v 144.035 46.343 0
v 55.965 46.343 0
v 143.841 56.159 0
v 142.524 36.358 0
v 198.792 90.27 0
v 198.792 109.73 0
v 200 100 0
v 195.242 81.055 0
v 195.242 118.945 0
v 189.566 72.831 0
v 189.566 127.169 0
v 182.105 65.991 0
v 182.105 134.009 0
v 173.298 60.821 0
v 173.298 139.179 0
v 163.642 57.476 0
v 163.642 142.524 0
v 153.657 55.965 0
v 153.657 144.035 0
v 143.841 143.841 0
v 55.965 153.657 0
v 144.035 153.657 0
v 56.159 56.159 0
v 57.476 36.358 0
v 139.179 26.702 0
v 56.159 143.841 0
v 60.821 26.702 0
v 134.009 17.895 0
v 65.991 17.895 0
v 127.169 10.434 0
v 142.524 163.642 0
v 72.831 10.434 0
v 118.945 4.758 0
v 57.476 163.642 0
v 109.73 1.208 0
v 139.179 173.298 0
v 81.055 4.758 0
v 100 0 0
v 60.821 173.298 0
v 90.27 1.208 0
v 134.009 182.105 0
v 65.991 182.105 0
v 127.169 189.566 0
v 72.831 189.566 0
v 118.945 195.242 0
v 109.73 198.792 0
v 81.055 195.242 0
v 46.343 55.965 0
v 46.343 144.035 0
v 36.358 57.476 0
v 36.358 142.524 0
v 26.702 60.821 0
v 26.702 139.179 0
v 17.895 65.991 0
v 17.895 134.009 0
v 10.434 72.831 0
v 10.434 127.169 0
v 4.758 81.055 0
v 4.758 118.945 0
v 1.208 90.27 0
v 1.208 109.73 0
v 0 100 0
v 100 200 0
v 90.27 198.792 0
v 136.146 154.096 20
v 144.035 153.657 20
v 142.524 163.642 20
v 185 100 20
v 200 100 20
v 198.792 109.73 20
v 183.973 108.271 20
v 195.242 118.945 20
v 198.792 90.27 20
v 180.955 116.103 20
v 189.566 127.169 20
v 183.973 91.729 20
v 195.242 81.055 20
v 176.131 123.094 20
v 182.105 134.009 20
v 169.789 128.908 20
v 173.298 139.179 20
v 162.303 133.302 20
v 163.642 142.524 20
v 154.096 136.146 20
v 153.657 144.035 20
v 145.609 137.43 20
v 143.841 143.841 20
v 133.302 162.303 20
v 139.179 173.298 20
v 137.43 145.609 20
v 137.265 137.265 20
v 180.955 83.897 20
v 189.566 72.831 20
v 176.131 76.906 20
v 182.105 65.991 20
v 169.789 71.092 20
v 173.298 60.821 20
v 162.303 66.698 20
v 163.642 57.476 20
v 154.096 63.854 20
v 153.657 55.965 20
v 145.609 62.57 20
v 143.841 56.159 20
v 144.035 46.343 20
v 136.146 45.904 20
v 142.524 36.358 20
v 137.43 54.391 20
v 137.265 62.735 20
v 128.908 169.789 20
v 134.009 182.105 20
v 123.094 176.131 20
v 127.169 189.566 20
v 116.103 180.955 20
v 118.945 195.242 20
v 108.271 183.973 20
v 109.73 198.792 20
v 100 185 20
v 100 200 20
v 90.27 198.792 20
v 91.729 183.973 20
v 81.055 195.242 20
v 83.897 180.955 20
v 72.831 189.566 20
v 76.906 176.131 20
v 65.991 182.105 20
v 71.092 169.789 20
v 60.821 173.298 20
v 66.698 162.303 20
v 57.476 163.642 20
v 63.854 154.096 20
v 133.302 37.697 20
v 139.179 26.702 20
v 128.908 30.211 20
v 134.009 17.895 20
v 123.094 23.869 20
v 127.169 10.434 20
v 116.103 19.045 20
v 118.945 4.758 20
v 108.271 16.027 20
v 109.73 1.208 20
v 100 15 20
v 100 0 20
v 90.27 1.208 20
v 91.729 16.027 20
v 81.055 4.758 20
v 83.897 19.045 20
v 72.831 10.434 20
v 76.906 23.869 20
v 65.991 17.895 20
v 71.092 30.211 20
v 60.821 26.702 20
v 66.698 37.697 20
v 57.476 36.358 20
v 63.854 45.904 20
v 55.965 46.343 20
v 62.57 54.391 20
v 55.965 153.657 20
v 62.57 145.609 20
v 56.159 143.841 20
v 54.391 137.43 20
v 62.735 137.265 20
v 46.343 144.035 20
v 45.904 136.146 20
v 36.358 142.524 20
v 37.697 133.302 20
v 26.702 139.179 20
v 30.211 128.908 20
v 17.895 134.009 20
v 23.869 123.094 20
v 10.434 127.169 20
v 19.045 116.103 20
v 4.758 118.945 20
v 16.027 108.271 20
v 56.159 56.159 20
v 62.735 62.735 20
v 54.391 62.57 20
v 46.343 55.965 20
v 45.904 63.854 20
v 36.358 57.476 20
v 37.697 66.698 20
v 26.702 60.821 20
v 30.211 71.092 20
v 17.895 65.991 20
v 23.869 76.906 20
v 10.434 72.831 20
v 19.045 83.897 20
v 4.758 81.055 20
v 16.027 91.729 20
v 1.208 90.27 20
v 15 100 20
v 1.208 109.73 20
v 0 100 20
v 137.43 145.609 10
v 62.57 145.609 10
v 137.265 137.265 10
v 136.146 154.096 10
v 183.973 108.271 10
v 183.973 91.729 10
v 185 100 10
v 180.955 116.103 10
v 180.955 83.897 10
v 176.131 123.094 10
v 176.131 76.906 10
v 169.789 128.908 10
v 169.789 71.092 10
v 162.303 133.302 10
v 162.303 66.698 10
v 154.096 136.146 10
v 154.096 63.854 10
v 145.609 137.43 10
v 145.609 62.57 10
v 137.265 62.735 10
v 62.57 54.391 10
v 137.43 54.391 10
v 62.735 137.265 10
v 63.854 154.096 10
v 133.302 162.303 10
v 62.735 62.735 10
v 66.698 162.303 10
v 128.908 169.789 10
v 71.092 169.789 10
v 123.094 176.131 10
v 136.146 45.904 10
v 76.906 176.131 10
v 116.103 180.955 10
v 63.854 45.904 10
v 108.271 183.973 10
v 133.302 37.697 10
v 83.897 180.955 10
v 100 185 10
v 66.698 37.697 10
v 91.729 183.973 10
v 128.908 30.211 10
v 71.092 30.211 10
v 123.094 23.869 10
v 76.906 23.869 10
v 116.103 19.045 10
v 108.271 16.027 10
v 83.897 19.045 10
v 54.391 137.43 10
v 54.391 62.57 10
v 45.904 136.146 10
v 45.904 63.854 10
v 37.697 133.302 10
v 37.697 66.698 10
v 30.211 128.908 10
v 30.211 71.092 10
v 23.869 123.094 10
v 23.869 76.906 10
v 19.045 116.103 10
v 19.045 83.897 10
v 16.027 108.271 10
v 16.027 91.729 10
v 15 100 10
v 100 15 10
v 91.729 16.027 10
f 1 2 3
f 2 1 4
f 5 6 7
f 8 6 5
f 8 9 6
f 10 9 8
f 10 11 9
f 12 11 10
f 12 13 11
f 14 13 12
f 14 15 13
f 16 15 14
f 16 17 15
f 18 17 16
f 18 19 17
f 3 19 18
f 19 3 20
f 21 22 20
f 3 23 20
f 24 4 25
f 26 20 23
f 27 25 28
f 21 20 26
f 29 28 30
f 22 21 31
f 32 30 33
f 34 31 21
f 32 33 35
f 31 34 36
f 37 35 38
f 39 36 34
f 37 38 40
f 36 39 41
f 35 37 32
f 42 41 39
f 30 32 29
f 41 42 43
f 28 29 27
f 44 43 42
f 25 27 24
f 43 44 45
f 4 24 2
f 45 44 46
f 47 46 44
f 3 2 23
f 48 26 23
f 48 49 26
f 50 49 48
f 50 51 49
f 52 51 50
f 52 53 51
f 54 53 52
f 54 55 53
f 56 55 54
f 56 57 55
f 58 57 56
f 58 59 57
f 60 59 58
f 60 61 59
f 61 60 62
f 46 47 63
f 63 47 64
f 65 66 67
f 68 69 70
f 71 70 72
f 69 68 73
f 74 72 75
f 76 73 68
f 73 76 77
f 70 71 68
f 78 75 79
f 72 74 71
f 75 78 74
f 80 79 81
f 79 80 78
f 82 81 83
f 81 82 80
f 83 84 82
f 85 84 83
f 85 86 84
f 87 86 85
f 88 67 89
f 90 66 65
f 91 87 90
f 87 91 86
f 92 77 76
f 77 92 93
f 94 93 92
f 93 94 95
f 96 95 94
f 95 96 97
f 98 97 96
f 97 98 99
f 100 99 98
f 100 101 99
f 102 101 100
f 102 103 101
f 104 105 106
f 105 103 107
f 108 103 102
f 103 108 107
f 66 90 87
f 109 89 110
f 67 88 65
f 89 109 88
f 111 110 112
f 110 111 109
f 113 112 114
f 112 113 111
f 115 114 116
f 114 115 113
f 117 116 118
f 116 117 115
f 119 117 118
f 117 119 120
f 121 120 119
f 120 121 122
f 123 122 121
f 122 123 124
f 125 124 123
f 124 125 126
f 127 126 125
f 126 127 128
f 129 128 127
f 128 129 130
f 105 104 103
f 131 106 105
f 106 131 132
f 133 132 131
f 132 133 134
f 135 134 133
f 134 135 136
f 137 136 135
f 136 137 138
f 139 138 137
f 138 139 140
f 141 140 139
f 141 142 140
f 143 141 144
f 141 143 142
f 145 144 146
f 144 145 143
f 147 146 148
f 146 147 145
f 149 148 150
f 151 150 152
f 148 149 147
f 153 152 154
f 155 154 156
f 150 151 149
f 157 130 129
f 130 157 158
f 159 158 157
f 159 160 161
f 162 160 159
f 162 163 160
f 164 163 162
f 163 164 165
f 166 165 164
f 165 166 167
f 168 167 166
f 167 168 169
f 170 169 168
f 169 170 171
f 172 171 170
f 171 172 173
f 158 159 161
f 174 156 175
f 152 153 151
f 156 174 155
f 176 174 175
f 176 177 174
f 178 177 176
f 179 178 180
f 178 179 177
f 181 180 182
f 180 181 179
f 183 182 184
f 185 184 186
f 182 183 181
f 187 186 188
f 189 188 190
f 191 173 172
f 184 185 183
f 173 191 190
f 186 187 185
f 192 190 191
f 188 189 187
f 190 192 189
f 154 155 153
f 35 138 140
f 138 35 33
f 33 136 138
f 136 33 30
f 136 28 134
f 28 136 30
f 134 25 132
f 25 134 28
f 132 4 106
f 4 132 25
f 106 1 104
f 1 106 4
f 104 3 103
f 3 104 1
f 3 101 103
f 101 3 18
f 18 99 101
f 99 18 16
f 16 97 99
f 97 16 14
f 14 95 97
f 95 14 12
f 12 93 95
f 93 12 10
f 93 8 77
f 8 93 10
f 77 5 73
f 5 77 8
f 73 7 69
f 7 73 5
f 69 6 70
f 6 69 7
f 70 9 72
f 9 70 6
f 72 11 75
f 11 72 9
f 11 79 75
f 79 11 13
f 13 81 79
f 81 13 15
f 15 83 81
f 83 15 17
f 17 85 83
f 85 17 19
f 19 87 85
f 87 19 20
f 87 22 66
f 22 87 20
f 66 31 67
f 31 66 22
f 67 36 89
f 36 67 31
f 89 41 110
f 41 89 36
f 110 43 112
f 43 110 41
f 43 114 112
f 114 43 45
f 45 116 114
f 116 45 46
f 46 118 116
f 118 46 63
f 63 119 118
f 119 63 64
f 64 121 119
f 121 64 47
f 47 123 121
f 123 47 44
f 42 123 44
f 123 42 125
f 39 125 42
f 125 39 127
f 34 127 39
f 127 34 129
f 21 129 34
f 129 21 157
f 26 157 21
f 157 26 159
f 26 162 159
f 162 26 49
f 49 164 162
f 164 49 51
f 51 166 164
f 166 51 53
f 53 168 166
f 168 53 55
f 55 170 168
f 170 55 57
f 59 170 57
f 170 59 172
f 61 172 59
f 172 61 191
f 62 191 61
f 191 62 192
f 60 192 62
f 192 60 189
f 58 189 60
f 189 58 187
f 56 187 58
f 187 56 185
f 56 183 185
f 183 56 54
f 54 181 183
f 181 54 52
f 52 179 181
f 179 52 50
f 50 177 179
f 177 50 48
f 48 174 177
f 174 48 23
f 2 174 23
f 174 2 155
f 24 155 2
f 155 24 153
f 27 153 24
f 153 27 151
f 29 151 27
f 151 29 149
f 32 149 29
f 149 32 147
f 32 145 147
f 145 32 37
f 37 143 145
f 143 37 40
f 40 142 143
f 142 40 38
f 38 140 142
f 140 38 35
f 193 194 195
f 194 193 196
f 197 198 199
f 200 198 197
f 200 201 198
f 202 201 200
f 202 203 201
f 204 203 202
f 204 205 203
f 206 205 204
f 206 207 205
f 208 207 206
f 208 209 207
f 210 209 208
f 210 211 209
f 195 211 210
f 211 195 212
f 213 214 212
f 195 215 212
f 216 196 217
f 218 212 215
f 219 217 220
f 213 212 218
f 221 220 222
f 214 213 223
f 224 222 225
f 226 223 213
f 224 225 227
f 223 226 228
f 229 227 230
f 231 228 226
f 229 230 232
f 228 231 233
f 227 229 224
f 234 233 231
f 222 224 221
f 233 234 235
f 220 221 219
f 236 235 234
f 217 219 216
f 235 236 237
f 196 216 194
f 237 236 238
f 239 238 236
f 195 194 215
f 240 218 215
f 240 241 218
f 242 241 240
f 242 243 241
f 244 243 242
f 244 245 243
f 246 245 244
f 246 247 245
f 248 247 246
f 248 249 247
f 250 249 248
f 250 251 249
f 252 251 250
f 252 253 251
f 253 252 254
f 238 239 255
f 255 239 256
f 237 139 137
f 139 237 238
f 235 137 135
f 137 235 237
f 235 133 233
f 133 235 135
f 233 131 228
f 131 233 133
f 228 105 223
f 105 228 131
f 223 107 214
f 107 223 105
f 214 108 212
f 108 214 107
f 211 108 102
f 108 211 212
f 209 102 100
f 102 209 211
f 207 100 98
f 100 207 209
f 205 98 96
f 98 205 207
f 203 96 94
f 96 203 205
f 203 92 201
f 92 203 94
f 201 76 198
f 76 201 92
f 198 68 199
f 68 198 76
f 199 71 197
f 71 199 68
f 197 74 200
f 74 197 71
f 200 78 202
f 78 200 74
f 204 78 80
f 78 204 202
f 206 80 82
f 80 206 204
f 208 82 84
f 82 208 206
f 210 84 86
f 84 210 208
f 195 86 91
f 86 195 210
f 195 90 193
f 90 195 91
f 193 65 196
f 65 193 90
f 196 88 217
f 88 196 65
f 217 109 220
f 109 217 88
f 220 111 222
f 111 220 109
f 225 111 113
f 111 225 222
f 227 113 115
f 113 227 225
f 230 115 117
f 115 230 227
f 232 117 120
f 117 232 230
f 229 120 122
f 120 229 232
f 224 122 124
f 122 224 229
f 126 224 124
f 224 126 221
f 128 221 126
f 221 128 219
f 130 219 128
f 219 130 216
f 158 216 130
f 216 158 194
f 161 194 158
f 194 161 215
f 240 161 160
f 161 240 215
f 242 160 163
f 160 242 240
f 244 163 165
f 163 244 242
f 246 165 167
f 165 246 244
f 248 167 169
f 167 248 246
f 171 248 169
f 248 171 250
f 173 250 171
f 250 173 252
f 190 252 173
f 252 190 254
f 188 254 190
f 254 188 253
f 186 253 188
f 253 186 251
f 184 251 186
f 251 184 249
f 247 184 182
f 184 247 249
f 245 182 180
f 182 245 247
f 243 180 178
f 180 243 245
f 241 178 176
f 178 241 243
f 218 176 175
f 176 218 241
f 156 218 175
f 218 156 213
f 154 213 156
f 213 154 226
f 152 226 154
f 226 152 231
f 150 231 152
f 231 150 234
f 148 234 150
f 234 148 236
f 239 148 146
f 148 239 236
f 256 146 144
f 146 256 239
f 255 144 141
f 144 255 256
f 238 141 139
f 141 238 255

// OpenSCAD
// === UNITS ===
// units: mm
// 图纸无单位符号，按尺寸量级判定为 mm。

// === SKETCH TRANSCRIPTION ===
//   "200 mm" (vertical) -> outer overall Y extent -> stock_y
//   "200 mm" (horizontal) -> outer overall X extent -> stock_x
//   "pocket" (arrow to shaded interior) -> top-face recess -> pocket1
//   unlabeled freeform lobe outline -> outer freeform profile -> outer_2d
//   no side view / thickness label -> stock_z assumed

// === PARAMETERS ===
stock_x = 200;                 // overall X length, handwritten 200 mm
stock_y = 200;                 // overall Y width, handwritten 200 mm
stock_z = 20;                  // TODO: verify — no thickness dimension on sketch; assumed typical board thickness
eps = 0.1;                     // cutter overshoot
outer_n = 64;                  // number of points around freeform outline
lobe_min = 0.62;               // TODO: verify — estimated waist radius fraction of freeform outer profile
lobe_max = 1.00;               // TODO: verify — estimated tip radius fraction of freeform outer profile
pocket1_inset = 15;            // TODO: verify — estimated rim/wall between outer edge and pocket
pocket1_depth = stock_z * 0.5; // TODO: verify — blind pocket depth, no side view; assumed 50% stock_z
pocket1_corner_r = 12;         // TODO: verify — estimated pocket curve/tool radius; not directly used if smooth
tool_d = 6.35;                 // default 1/4 in end mill
min_wall = 6;                  // minimum wall between features / edge
min_inside_corner_r = tool_d / 2; // 3.175

pocket_hx = stock_x / 2 - pocket1_inset; // derived pocket half-extent X
pocket_hy = stock_y / 2 - pocket1_inset; // derived pocket half-extent Y

// === ASSUMPTIONS ===
// - Units: no unit symbols; 200-mm magnitudes are typical for a wooden serving board.
// - Thickness: no side view; stock_z = 20 mm assumed; TODO: verify.
// - Outer freeform profile is approximated by a four-lobed polar curve using
//   lobe_min / lobe_max; no vector outline was readable; TODO: verify.
// - "pocket" is a single blind recess; no pocket dimensions are written, so it is
//   modeled as an inward inset copy of the outer profile, rim = pocket1_inset;
//   TODO: verify actual pocket shape/position.
// - Pocket depth = 0.5 * stock_z; floor remains 10 mm (50% stock_z), OK.
// - No holes, slots, juice groove, handle, edge chamfer, or roundover are drawn.
// - Tool radius: pocket boundaries are approximated smooth; expected inside
//   corner radius >= min_inside_corner_r; TODO: verify toolpath.
// - Ambiguous freeform outline: right/left/top/bottom lobes are treated as
//   symmetric; any handle-like protrusion would need a separate sketch.

// === MODEL ===
$fn = 64;

function lobe_pt(a, hx, hy, lmin, lmax) =
    let(f = lmin + (lmax - lmin) * abs(cos(2 * a)))
    [ hx * cos(a) * f, hy * sin(a) * f ];

module outer_2d() {
    polygon(points = [
        for (i = [0 : outer_n - 1])
            lobe_pt(i * 360 / outer_n, stock_x / 2, stock_y / 2, lobe_min, lobe_max)
    ]);
}

module pocket1_2d() {
    polygon(points = [
        for (i = [0 : outer_n - 1])
            lobe_pt(i * 360 / outer_n, pocket_hx, pocket_hy, lobe_min, lobe_max)
    ]);
}

module board() {
    difference() {
        translate([stock_x / 2, stock_y / 2, 0])
            linear_extrude(height = stock_z, convexity = 10)
                outer_2d();

        translate([stock_x / 2, stock_y / 2, stock_z - pocket1_depth])
            linear_extrude(height = pocket1_depth + eps, convexity = 10)
                pocket1_2d();
    }
}

board();

// === CHECKS ===
// - outer profile touches stock edges at X=0/stock_x and Y=0/stock_y: OK
// - pocket wall to outer edge = pocket1_inset = 15 >= min_wall (6): OK
// - blind pocket floor = stock_z - pocket1_depth = 10 >= 0.3 * stock_z (6): OK
// - cutter radius: default tool_d = 6.35 (R=3.175); pocket curve is smooth,
//   no inside corner sharper than tool radius: OK (estimated)
// - all cuts are from top face; no through cuts: OK
